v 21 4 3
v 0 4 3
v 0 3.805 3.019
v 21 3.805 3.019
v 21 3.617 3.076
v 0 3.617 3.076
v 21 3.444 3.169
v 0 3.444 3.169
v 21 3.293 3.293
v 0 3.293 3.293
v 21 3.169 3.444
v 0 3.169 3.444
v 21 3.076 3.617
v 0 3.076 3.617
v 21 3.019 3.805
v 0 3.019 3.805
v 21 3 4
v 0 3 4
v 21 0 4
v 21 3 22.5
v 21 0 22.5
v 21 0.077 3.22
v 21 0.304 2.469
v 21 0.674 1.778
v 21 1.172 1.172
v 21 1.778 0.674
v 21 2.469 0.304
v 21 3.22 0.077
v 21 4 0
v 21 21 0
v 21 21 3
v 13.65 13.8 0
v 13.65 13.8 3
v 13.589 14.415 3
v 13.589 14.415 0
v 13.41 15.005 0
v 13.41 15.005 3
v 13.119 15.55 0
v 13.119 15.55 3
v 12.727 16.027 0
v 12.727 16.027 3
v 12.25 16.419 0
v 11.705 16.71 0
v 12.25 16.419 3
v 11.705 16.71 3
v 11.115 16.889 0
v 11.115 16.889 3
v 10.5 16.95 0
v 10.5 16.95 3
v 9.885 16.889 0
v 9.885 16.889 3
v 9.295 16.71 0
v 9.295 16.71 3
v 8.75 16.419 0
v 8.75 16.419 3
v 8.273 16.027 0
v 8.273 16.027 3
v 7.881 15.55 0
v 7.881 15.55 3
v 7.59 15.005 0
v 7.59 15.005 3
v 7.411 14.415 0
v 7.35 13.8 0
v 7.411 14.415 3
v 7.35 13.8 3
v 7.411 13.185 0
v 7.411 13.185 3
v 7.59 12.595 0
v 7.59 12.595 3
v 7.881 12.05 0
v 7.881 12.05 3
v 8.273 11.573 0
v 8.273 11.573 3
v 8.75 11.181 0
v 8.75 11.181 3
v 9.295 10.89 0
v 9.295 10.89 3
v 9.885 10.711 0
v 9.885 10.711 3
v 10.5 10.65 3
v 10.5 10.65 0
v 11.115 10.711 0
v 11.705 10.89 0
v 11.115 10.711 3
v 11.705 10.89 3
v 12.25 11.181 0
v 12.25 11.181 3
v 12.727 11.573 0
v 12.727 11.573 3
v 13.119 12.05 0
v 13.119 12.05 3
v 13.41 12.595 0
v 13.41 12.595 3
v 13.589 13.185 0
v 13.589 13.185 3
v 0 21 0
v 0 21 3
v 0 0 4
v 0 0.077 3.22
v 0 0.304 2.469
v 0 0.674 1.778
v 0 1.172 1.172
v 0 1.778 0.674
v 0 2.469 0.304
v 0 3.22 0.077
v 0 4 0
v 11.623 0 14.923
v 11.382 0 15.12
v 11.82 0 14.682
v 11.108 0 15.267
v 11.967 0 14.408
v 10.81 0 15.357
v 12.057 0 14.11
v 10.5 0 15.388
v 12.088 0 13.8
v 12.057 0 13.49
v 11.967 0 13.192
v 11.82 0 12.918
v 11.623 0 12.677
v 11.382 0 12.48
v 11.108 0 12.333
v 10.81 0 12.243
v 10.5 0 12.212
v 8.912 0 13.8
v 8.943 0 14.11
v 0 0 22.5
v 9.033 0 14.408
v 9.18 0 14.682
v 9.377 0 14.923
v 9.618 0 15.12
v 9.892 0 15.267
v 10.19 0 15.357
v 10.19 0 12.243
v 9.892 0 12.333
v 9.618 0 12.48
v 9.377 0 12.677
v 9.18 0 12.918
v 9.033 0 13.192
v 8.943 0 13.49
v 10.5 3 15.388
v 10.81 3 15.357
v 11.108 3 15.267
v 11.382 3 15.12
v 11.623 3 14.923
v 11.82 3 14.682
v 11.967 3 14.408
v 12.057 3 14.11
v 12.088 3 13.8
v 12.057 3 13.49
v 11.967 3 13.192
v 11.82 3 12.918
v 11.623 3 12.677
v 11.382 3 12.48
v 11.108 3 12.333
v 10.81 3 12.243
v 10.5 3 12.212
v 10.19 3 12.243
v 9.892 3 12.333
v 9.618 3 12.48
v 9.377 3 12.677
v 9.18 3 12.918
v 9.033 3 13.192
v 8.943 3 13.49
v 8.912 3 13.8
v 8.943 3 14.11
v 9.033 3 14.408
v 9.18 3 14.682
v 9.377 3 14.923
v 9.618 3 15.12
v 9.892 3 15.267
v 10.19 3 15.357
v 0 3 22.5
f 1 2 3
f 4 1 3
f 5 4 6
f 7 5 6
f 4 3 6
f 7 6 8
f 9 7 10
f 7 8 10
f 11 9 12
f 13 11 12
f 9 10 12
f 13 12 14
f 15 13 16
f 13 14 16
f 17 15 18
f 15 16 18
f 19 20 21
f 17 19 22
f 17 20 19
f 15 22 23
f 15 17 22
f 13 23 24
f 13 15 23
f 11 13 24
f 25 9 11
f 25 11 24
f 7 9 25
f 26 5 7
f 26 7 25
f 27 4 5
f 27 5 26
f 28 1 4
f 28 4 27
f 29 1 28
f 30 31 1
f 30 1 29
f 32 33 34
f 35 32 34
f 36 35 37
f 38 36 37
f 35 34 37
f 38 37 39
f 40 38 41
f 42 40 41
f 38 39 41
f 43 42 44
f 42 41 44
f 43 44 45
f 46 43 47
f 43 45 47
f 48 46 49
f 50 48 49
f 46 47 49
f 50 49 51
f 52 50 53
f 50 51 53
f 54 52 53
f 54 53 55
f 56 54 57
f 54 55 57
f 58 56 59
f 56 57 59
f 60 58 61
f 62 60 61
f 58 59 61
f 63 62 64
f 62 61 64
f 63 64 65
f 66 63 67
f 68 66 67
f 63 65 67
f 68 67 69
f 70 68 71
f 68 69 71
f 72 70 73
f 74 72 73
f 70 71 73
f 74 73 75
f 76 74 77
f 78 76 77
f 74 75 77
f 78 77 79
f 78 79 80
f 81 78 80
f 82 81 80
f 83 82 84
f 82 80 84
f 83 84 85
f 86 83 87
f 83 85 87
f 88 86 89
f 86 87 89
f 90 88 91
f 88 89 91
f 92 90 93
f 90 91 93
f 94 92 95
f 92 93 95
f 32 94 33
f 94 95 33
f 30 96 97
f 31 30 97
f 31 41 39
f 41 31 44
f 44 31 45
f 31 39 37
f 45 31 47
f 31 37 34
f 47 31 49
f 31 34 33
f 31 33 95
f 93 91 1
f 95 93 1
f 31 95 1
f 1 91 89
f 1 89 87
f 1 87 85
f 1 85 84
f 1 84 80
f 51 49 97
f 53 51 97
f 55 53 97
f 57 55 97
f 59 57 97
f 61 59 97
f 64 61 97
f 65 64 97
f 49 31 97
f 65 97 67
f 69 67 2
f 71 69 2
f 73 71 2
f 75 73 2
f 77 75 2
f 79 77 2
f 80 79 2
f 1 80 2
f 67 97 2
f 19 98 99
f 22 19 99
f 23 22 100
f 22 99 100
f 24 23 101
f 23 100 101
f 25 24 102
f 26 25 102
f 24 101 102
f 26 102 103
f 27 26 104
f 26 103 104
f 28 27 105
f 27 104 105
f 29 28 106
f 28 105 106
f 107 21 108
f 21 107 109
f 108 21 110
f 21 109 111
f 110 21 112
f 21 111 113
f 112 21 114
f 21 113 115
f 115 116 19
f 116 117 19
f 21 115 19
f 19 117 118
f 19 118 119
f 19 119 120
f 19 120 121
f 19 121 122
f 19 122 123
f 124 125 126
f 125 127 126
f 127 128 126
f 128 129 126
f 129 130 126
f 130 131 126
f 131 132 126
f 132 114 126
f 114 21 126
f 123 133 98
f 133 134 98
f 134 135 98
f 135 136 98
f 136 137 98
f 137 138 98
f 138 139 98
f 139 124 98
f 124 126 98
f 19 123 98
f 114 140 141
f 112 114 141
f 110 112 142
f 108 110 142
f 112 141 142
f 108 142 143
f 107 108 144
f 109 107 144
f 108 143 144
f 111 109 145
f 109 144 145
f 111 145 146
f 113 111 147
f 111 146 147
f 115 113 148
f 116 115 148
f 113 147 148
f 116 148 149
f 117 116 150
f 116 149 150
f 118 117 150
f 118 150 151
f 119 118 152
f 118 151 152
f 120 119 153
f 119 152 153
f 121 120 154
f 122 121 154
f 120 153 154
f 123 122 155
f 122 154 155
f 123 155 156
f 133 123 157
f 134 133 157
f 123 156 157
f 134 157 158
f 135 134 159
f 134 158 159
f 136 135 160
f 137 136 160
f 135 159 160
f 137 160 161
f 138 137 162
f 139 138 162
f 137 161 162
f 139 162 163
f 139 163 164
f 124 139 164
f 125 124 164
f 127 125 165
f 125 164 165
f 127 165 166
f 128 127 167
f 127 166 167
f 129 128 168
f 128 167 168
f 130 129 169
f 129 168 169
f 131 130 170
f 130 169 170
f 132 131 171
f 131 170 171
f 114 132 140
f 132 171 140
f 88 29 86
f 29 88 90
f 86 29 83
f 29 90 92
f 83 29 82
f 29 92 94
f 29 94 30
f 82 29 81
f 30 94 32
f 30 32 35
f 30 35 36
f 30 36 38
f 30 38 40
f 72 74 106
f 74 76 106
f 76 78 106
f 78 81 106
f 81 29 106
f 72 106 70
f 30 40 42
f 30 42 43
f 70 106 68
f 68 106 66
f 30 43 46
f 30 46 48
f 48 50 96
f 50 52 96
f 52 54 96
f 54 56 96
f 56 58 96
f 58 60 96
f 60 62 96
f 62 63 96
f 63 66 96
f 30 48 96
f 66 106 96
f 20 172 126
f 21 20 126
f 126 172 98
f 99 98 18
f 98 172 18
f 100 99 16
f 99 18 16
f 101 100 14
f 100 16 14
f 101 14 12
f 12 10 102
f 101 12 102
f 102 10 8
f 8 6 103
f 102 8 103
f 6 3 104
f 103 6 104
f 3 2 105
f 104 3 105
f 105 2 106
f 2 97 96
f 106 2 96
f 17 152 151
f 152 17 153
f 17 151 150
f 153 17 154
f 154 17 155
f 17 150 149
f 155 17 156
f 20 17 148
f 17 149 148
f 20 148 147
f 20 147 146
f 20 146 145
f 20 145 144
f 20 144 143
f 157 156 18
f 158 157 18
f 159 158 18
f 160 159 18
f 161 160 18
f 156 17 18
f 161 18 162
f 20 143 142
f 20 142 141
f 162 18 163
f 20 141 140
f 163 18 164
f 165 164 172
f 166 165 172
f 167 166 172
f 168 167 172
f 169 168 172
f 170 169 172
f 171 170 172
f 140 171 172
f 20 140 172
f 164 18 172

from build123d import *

# Parameters (mm, degrees)
EXTRUDE1_DEPTH = 21
SKETCH3_R      = 1.5875
EXTRUDE2_DEPTH = 3
SKETCH4_R      = 3.15
EXTRUDE3_DEPTH = 3


with BuildPart() as part:
    # Sketch2 → Extrude1 (new body)
    with BuildSketch(Plane(origin=(0, 0, 0), x_dir=(0, 0, -1), z_dir=(1, 0, 0))):
        with BuildLine():
            Line((0, 4), (0, 21))
            Line((0, 21), (-3, 21))
            Line((-3, 21), (-3, 4))
            ThreePointArc((-3, 4), (-3.292893219, 3.292893219), (-4, 3))
            Line((-4, 3), (-22.5, 3))
            Line((-22.5, 3), (-22.5, 0))
            Line((-22.5, 0), (-4, 0))
            ThreePointArc((-4, 0), (-1.171572875, 1.171572875), (0, 4))
        make_face()
    extrude(amount=EXTRUDE1_DEPTH)

    # Sketch3 → Extrude2 (cut)
    with BuildSketch(Plane(origin=(0, 3, 0), x_dir=(1, 0, 0), z_dir=(0, 1, 0))):
        with Locations(Location((10.5, -13.8, 0), (0, 0, 270))):
            Circle(SKETCH3_R)
    extrude(amount=-EXTRUDE2_DEPTH, mode=Mode.SUBTRACT)

    # Sketch4 → Extrude3 (cut)
    with BuildSketch(Plane.XY.offset(3)):
        with Locations((10.5, 13.8)):
            Circle(SKETCH4_R)
    extrude(amount=-EXTRUDE3_DEPTH, mode=Mode.SUBTRACT)


solid = part.part
